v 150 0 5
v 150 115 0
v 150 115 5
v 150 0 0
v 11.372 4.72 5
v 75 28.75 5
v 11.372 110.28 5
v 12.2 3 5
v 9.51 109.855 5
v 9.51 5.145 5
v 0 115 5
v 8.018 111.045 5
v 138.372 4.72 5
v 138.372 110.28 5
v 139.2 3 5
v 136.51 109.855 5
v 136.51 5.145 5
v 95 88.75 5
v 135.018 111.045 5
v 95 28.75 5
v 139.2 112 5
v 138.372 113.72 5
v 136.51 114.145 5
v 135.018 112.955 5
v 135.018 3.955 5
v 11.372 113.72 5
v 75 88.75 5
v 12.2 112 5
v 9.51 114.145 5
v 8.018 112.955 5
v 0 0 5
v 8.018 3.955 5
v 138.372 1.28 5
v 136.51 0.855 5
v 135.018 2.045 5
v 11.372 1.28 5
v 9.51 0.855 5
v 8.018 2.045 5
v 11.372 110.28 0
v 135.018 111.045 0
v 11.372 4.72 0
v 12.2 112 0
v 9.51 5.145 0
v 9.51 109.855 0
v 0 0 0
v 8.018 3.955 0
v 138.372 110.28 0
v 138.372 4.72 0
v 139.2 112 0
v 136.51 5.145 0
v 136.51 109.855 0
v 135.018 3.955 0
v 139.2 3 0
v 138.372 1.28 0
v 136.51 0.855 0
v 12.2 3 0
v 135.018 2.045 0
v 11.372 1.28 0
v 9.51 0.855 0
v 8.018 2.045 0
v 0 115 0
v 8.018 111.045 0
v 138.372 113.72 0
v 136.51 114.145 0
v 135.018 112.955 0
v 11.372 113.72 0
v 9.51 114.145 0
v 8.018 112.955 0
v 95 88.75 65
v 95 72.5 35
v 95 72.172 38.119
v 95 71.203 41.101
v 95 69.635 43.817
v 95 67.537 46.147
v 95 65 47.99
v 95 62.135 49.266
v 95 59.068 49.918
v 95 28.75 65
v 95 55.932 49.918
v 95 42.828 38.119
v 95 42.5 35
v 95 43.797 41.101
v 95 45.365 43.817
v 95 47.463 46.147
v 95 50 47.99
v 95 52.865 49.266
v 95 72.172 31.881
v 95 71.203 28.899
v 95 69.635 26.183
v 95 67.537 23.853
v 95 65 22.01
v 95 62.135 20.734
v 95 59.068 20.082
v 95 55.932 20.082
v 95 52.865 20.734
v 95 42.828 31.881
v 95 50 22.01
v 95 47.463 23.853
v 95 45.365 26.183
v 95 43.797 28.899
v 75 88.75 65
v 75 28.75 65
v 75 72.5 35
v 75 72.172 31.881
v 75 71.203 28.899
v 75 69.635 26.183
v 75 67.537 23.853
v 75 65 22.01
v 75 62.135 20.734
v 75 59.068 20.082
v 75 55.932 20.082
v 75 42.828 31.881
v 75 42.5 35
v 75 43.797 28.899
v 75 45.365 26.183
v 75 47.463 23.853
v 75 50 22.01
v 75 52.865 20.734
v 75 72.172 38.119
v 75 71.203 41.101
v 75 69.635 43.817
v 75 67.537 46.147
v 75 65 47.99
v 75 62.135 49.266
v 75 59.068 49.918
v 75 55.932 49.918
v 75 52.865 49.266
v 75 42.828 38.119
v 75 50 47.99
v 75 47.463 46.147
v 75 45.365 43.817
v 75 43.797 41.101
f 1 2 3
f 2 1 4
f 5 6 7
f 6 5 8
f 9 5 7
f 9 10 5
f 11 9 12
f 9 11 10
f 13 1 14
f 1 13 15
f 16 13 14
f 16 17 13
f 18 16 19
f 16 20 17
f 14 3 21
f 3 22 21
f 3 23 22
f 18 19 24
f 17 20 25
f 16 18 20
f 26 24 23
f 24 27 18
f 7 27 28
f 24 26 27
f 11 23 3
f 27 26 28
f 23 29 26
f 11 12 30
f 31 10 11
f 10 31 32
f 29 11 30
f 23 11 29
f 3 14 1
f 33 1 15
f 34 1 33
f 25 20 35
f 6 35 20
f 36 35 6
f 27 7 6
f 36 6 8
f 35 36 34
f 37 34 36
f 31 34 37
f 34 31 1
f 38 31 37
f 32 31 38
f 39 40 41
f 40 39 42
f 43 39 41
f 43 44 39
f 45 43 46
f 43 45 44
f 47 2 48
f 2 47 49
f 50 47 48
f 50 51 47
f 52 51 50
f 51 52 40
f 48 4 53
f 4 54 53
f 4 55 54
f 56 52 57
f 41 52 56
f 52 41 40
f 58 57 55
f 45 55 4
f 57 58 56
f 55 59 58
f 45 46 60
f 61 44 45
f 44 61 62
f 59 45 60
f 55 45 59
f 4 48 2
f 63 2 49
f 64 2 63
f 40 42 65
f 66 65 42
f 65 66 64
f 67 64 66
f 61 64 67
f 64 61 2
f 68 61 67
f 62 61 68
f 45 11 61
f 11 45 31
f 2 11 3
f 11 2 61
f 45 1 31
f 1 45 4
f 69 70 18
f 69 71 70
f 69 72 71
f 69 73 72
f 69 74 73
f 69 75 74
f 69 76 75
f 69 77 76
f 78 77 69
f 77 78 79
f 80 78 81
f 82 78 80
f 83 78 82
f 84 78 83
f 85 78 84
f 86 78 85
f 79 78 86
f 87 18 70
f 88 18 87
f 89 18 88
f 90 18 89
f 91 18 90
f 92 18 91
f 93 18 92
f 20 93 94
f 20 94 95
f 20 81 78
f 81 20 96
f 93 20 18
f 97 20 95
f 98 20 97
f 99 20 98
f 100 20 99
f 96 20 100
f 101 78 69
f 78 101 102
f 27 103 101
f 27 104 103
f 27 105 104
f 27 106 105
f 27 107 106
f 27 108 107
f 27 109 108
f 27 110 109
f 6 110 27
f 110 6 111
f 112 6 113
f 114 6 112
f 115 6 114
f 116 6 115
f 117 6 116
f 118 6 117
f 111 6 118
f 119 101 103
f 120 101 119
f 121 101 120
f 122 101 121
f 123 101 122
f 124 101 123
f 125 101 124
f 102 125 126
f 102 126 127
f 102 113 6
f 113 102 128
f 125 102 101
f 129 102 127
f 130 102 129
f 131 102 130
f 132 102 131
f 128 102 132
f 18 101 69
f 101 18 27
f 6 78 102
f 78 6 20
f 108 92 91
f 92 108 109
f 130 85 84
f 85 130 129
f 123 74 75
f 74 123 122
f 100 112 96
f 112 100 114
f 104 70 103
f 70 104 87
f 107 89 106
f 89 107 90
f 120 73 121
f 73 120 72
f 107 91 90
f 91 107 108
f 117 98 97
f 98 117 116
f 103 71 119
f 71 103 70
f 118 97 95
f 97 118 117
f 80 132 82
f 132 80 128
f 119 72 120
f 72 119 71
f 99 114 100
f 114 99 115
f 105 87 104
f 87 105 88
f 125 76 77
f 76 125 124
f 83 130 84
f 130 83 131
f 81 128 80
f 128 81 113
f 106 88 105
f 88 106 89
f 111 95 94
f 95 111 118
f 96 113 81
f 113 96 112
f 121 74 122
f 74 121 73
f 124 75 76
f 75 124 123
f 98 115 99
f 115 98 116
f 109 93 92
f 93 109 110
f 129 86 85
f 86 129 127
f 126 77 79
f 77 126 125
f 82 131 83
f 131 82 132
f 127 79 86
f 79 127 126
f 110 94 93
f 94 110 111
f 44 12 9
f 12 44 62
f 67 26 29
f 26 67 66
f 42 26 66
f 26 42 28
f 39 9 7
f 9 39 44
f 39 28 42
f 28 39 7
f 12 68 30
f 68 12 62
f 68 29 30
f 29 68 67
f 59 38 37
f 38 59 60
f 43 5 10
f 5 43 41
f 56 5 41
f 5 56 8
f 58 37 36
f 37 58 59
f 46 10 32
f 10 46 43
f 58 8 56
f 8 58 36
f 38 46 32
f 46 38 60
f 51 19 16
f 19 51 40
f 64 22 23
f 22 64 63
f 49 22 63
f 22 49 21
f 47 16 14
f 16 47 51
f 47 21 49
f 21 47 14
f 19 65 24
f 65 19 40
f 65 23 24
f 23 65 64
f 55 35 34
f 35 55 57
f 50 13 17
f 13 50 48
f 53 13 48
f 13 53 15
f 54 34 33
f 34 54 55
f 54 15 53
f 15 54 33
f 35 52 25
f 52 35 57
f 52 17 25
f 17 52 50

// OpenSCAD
//Computer mount for Nvidia Xaviar NX
wb=115/2.;
th=5; // thickness
//rotate([0,-90,0]) //to minimize overhangs, speed print. comment out if editing
 difference() {
        union() {
            //base
            color("darkred") cube([150,115,th]); //length, width, height
            color("green") translate([75,wb/2,0]) cube([20,60,65]); //length, width, height
            //sides

            }   

// These parts are subtrated from the above. 
        //Screw holes
            rotate([90,0,90])
            {
            color("darkblue") translate([115/2,35,75]) cylinder(h=20,r = 15) ;  
                }
        //Threaded hole    
        color("darkgreen") translate([10,wb*2-3,-1]) cylinder(h=th+2,r = 2.2);
        color("darkgreen") translate([10,3,-1]) cylinder(h=th+2,r = 2.2);
        color("darkgreen") translate([137,wb*2-3,-1]) cylinder(h=th+2,r = 2.2);
        color("darkgreen") translate([137,3,-1]) cylinder(h=th+2,r = 2.2);
       

 }
